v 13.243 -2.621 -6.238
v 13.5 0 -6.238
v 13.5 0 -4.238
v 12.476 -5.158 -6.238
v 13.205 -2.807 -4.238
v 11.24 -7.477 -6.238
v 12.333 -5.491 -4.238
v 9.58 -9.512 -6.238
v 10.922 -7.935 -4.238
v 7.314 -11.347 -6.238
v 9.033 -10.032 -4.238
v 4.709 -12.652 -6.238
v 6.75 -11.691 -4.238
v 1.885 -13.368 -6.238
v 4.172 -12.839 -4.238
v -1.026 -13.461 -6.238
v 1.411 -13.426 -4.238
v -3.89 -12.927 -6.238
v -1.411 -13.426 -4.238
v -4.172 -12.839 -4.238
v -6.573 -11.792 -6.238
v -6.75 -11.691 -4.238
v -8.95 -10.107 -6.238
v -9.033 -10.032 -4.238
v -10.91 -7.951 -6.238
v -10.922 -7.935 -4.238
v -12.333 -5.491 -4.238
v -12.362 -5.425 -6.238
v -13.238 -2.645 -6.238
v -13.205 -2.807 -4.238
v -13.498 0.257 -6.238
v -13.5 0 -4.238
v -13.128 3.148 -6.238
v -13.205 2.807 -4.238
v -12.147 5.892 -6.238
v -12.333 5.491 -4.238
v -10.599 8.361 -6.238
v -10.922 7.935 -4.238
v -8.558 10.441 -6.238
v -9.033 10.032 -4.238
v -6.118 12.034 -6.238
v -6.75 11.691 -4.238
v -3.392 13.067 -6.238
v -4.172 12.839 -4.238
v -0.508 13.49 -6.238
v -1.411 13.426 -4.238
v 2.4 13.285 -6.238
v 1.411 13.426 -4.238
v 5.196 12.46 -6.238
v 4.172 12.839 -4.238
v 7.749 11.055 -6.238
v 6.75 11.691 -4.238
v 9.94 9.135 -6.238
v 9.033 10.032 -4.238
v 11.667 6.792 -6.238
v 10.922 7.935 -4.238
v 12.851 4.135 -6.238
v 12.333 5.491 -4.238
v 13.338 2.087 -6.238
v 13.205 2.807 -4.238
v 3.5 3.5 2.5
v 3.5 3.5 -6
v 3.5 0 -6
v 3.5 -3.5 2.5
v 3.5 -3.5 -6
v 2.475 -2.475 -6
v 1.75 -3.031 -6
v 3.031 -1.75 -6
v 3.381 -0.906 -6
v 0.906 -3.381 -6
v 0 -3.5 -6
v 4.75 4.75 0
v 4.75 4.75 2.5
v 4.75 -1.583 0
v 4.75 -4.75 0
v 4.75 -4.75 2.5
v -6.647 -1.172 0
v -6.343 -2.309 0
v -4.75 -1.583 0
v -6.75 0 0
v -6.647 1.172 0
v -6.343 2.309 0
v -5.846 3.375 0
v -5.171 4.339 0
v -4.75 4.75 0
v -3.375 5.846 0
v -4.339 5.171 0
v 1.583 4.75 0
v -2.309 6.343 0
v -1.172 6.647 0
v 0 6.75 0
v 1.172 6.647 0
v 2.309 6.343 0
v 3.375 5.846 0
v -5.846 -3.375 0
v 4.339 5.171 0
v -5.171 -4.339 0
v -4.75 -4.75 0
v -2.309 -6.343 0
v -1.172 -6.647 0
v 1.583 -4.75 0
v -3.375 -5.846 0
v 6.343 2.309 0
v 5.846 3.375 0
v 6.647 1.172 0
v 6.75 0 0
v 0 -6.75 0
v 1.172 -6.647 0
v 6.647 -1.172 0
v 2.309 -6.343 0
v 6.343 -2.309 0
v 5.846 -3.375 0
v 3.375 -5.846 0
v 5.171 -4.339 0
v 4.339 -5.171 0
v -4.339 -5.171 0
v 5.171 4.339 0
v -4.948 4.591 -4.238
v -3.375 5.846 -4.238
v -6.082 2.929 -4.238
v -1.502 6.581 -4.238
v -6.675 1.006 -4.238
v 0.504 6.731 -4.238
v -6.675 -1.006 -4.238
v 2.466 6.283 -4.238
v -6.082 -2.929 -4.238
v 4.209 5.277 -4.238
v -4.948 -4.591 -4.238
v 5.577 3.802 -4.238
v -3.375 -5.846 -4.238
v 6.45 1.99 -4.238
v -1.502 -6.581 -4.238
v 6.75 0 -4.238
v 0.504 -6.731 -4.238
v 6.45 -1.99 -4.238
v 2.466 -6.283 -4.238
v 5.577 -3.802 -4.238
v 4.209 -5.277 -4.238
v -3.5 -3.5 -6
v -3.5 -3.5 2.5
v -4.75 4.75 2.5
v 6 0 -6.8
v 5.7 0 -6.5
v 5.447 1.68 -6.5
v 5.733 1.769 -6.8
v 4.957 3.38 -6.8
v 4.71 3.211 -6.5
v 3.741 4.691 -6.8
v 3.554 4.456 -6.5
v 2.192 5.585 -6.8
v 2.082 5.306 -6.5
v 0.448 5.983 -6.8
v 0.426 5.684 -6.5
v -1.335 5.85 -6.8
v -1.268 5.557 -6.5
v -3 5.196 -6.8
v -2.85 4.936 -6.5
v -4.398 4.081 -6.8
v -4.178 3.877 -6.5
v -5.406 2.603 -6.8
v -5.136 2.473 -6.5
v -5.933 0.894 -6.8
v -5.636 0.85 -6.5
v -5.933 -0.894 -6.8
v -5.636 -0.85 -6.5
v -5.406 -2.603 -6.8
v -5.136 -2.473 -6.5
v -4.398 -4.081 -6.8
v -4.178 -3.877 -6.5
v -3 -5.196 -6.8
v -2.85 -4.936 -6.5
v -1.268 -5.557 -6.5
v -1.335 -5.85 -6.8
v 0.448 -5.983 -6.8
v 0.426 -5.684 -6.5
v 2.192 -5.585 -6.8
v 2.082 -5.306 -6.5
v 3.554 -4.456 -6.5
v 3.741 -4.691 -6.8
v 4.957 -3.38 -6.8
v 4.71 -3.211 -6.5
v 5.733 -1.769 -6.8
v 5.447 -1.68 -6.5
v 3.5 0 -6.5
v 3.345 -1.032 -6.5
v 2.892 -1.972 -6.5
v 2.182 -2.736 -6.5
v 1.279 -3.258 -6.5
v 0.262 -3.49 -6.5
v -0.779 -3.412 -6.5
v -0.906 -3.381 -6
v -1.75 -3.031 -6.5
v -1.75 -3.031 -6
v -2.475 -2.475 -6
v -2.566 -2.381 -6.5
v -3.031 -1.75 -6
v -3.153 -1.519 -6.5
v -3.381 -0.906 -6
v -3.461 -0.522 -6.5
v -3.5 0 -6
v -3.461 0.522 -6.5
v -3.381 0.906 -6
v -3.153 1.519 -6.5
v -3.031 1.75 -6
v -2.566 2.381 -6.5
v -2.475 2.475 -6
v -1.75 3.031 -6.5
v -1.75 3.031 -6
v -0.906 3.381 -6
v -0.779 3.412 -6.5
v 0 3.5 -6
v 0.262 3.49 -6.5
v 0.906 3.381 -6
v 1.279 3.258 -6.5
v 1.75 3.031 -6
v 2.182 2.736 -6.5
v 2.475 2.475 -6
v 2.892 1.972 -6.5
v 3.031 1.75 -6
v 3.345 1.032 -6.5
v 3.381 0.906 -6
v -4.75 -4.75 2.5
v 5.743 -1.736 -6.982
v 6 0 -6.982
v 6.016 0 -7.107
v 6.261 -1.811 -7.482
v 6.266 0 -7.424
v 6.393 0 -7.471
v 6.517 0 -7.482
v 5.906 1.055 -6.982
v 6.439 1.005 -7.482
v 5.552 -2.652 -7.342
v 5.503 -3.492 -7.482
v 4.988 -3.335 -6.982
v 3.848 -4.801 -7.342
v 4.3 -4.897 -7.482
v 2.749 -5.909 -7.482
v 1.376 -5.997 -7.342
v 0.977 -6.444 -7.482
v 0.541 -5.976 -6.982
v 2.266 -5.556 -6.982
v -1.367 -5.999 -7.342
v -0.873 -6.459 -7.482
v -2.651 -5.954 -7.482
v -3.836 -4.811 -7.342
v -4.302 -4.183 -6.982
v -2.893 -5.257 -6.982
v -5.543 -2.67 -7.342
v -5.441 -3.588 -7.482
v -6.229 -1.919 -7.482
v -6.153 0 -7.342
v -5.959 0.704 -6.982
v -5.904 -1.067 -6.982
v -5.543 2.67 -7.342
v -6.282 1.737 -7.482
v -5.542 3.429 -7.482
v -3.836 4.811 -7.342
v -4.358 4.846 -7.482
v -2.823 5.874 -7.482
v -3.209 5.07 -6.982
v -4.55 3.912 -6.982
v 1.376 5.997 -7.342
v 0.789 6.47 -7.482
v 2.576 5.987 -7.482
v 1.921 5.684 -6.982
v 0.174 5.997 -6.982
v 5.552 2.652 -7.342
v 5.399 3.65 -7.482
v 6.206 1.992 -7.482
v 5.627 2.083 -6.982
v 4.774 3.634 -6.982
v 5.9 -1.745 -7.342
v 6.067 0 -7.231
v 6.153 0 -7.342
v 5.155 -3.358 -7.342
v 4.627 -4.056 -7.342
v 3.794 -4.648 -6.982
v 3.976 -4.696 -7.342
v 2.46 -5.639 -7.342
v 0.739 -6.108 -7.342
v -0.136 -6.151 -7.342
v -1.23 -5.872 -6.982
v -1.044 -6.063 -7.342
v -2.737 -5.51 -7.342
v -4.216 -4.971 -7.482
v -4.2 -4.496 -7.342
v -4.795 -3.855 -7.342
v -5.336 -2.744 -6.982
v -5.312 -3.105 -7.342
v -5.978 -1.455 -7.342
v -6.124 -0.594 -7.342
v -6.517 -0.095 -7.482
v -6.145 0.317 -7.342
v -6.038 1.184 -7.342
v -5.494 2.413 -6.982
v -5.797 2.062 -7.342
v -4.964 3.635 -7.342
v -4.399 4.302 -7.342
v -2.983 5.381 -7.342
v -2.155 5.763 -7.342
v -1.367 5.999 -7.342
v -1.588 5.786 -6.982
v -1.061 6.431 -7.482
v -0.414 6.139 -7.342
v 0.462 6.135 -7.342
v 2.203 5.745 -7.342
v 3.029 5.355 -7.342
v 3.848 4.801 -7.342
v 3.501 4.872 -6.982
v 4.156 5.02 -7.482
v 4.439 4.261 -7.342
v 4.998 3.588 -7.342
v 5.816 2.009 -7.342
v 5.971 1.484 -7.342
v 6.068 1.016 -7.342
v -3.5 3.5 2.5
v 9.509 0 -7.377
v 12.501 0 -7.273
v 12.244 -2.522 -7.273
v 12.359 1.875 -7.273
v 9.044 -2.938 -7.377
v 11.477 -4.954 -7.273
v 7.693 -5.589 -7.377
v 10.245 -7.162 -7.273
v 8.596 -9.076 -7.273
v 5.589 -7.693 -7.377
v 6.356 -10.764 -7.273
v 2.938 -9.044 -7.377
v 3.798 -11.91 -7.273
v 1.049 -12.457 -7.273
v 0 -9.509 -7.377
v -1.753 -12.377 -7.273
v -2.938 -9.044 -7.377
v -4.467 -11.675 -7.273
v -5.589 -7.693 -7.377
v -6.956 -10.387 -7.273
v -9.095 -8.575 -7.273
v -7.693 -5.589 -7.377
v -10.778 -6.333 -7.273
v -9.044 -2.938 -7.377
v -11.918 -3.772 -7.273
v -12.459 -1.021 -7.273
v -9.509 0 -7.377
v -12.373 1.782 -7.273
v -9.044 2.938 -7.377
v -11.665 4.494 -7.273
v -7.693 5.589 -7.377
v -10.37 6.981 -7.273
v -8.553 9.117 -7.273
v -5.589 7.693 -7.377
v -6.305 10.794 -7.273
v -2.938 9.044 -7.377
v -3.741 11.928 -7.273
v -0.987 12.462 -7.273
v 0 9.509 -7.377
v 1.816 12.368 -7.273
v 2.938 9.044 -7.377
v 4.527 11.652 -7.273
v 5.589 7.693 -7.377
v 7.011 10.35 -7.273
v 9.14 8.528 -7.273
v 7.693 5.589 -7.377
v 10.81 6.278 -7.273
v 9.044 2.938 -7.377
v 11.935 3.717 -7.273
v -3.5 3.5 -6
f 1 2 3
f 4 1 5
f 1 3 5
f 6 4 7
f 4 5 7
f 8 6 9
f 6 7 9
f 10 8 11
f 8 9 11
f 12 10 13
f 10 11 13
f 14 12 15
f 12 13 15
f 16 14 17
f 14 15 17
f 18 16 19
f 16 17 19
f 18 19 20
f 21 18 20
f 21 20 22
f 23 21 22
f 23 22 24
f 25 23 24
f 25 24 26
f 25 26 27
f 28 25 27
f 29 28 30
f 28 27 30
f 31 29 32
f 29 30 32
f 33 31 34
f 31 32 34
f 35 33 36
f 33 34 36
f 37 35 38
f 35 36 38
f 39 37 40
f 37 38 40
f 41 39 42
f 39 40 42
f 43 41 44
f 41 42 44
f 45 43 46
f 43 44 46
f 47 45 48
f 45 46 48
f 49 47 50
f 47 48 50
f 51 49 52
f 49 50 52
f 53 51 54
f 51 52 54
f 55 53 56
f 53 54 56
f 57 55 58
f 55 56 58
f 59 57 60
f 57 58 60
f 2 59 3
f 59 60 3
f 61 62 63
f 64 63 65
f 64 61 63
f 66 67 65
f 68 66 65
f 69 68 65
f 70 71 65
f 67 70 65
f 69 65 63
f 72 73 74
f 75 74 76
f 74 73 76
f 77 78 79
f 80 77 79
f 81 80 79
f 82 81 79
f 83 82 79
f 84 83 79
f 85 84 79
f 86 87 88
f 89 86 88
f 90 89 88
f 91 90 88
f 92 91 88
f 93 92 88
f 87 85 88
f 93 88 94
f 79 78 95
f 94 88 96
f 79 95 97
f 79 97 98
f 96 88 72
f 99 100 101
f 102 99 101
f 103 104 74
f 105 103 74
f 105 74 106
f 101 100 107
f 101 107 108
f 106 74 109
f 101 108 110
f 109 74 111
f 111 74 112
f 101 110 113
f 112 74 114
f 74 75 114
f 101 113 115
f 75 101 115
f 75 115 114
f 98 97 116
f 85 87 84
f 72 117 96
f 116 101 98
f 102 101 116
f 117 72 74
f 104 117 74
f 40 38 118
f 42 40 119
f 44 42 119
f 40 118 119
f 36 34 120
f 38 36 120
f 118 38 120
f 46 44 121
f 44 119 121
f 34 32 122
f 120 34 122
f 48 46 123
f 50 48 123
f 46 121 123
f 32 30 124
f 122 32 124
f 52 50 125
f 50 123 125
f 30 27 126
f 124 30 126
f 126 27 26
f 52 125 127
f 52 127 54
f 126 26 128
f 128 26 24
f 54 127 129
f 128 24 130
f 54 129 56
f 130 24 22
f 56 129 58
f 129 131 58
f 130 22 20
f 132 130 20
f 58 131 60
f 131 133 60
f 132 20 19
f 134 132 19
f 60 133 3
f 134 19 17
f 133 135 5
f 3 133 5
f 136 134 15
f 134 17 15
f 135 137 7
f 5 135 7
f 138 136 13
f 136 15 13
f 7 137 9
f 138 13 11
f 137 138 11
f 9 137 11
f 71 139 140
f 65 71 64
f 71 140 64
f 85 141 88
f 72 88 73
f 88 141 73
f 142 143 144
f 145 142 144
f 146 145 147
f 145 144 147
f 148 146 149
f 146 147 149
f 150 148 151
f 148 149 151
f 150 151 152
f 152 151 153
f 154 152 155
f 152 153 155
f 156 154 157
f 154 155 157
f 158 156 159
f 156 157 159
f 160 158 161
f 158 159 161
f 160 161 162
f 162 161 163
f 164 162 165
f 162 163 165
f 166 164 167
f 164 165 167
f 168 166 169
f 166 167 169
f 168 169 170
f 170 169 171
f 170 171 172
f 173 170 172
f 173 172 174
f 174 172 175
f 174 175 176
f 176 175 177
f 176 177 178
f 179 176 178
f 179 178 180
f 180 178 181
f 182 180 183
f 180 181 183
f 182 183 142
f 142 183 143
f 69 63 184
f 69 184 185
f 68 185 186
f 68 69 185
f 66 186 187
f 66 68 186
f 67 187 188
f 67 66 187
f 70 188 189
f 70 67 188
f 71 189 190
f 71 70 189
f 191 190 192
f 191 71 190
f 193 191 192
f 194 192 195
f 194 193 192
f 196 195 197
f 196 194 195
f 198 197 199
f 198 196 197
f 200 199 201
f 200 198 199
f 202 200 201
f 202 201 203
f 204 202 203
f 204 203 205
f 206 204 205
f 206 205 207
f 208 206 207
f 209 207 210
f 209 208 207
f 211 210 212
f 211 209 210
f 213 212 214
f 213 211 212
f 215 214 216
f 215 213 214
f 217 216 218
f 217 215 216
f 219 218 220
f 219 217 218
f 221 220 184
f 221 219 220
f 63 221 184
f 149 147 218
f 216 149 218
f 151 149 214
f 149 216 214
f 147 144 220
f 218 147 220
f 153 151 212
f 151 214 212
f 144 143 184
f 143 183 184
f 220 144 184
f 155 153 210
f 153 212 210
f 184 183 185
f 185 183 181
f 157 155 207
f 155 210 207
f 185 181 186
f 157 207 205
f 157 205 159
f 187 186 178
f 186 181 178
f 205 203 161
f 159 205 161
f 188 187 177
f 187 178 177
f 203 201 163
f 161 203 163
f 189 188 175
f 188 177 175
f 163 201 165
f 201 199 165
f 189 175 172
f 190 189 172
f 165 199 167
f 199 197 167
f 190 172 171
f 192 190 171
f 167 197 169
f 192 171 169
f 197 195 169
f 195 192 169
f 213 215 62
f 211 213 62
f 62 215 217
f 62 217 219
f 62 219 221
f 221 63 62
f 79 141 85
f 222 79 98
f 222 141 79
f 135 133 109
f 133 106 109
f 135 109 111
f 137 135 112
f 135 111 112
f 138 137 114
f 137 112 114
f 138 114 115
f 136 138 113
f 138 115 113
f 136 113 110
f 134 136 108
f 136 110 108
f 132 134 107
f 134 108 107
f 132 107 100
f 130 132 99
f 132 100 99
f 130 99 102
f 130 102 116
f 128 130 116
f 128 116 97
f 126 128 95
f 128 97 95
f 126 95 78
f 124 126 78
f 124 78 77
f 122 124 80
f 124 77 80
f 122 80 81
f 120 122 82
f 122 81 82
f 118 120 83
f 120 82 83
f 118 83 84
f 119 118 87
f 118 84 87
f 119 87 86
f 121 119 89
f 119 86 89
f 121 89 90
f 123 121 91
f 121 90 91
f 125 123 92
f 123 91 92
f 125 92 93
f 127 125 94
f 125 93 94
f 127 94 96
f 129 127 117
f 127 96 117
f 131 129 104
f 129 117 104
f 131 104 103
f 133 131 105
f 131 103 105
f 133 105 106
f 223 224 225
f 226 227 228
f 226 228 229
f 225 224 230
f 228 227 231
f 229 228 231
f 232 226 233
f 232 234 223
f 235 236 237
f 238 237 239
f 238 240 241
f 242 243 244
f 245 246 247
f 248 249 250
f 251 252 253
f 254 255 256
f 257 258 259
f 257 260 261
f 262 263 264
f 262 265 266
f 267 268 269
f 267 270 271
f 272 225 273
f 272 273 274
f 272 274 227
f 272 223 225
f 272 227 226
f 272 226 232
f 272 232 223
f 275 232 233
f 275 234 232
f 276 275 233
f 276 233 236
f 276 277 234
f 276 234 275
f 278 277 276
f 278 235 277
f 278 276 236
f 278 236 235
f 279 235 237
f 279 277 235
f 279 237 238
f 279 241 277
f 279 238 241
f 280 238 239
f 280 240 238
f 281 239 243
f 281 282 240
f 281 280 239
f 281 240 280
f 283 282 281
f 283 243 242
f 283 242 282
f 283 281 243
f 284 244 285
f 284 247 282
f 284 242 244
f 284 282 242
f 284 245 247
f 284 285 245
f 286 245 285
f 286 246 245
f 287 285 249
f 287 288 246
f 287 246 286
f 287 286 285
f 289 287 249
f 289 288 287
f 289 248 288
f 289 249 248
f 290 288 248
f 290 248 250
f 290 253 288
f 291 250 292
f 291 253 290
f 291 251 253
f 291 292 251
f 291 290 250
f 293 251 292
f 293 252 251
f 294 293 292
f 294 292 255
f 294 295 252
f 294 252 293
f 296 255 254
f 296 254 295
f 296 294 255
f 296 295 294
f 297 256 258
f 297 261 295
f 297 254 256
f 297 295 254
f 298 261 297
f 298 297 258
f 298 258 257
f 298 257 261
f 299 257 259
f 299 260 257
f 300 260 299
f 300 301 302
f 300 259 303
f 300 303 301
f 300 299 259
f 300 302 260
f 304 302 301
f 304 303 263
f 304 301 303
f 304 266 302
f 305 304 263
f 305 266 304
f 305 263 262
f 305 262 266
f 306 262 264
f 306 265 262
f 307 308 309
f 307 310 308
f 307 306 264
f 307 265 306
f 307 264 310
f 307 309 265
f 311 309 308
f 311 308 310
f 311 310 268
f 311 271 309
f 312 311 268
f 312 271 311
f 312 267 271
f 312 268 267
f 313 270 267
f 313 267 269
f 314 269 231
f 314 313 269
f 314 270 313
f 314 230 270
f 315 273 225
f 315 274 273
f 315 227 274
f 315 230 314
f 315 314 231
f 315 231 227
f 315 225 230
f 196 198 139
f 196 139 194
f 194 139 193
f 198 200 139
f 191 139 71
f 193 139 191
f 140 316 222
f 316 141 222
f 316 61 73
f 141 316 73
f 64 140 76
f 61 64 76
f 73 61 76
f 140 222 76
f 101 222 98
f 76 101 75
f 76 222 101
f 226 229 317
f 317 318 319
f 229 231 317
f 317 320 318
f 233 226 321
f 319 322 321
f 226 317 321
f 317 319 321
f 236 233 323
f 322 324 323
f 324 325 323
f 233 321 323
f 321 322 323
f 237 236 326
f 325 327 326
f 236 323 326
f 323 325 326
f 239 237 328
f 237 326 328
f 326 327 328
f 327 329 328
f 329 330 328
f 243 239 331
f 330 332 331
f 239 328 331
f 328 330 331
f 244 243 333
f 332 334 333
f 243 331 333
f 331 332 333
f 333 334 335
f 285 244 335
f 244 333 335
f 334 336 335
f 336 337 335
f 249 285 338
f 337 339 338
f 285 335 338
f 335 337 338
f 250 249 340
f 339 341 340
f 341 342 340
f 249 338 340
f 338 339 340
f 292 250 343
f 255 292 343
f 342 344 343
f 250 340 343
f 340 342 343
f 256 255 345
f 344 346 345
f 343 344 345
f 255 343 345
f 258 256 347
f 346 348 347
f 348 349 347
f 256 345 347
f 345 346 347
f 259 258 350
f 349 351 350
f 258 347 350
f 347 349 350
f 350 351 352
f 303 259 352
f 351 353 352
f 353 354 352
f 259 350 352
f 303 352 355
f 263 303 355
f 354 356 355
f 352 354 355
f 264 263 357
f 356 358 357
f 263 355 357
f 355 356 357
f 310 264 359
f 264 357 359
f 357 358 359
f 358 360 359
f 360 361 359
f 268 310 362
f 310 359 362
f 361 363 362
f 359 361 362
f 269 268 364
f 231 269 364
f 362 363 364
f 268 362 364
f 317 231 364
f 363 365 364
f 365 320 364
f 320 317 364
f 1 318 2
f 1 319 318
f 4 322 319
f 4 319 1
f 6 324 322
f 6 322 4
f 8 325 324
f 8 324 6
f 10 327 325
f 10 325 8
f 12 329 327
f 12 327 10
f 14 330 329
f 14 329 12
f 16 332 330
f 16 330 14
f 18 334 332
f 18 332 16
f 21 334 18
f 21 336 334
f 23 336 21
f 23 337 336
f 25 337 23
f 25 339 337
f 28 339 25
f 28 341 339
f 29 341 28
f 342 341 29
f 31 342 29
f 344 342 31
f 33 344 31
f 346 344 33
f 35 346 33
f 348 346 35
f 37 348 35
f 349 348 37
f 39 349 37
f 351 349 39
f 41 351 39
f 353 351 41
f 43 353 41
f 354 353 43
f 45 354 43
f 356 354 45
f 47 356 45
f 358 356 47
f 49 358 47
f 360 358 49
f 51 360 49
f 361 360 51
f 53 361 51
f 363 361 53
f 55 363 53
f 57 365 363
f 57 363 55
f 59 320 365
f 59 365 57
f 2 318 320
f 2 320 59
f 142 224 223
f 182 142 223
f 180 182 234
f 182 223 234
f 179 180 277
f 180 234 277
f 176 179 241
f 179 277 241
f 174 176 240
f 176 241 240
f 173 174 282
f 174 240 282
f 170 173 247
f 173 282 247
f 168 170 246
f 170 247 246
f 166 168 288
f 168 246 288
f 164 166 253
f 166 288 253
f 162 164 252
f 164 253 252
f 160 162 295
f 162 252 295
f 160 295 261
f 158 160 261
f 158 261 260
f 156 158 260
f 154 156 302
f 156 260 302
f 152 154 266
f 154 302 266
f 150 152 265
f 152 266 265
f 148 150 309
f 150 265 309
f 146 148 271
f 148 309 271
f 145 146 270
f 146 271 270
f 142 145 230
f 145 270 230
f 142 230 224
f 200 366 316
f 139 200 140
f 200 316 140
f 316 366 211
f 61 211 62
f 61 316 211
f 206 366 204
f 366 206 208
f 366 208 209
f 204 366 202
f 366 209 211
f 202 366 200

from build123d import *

# Parameters (mm, degrees)
CYLINDER_R                 = 3.5
CYLINDER_DEPTH             = 13
BOX001_W                   = 7
BOX001_H                   = 7
BOX001_DEPTH               = 10.5
BOX_W                      = 9.5
BOX_H                      = 9.5
BOX_DEPTH                  = 9
CHAMFER_SIZE               = 0.3
FILLET_R                   = 0.5
CHAMFER001_SIZE            = 1
CHAMFER001_PLACEMENT_ANGLE = 180


with BuildPart() as cilindro:
    # Cylinder → Cylinder (new body)
    with BuildSketch(Plane.XY.offset(-5)):
        Circle(CYLINDER_R)
    extrude(amount=CYLINDER_DEPTH)


with BuildPart() as cubo001:
    # Box001 → Box001 (new body)
    with BuildSketch(Plane(origin=(-3.5, -3.5, -4.5), x_dir=(1, 0, 0), z_dir=(0, 0, 1))):
        with Locations((3.5, 3.5)):
            Rectangle(BOX001_W, BOX001_H)
    extrude(amount=BOX001_DEPTH)


with BuildPart() as cubo:
    # Box → Box (new body)
    with BuildSketch(Plane(origin=(-4.75, -4.75, -2.5), x_dir=(1, 0, 0), z_dir=(0, 0, 1))):
        with Locations((4.75, 4.75)):
            Rectangle(BOX_W, BOX_H)
    extrude(amount=BOX_DEPTH)


with BuildPart() as chamfer001:
    # Sketch → Revolution (revolve)
    with BuildSketch(Plane.XZ):
        Polygon((0, 0), (0, 6.5), (6, 6.5), (6, 7.5), (13.5, 7.238094), (13.5, 4.238094), (6.75, 4.238094), (6.75, 0), align=None)
    revolve(axis=Axis((0, 0, 0), (0, 0, 1)))

    # Fusion: union Cubo
    add(cubo.part)

    # Cut: cut Cubo001
    add(cubo001.part, mode=Mode.SUBTRACT)

    # Cut001: cut Cilindro
    add(cilindro.part, mode=Mode.SUBTRACT)

    # Chamfer
    chamfer_edges = [chamfer001.edges().sort_by_distance(p)[0] for p in [
        (5.678908, 1.936492, 6.5),
    ]]
    chamfer(chamfer_edges, length=CHAMFER_SIZE)

    # Fillet
    fillet_edges = [chamfer001.edges().sort_by_distance(p)[0] for p in [
        (-6, 0, 7.5),
    ]]
    fillet(fillet_edges, radius=FILLET_R)

    # Chamfer001
    chamfer001_edges = [chamfer001.edges().sort_by_distance(p)[0] for p in [
        (-13.5, 0, 7.238094),
    ]]
    chamfer(chamfer001_edges, length=CHAMFER001_SIZE)


with BuildPart() as chamfer001_1:
    # Chamfer001 placement: moved
    add(chamfer001.part.rotate(Axis((0, 0, 0), (1, 0, 0)), CHAMFER001_PLACEMENT_ANGLE))


solid = chamfer001_1.part
